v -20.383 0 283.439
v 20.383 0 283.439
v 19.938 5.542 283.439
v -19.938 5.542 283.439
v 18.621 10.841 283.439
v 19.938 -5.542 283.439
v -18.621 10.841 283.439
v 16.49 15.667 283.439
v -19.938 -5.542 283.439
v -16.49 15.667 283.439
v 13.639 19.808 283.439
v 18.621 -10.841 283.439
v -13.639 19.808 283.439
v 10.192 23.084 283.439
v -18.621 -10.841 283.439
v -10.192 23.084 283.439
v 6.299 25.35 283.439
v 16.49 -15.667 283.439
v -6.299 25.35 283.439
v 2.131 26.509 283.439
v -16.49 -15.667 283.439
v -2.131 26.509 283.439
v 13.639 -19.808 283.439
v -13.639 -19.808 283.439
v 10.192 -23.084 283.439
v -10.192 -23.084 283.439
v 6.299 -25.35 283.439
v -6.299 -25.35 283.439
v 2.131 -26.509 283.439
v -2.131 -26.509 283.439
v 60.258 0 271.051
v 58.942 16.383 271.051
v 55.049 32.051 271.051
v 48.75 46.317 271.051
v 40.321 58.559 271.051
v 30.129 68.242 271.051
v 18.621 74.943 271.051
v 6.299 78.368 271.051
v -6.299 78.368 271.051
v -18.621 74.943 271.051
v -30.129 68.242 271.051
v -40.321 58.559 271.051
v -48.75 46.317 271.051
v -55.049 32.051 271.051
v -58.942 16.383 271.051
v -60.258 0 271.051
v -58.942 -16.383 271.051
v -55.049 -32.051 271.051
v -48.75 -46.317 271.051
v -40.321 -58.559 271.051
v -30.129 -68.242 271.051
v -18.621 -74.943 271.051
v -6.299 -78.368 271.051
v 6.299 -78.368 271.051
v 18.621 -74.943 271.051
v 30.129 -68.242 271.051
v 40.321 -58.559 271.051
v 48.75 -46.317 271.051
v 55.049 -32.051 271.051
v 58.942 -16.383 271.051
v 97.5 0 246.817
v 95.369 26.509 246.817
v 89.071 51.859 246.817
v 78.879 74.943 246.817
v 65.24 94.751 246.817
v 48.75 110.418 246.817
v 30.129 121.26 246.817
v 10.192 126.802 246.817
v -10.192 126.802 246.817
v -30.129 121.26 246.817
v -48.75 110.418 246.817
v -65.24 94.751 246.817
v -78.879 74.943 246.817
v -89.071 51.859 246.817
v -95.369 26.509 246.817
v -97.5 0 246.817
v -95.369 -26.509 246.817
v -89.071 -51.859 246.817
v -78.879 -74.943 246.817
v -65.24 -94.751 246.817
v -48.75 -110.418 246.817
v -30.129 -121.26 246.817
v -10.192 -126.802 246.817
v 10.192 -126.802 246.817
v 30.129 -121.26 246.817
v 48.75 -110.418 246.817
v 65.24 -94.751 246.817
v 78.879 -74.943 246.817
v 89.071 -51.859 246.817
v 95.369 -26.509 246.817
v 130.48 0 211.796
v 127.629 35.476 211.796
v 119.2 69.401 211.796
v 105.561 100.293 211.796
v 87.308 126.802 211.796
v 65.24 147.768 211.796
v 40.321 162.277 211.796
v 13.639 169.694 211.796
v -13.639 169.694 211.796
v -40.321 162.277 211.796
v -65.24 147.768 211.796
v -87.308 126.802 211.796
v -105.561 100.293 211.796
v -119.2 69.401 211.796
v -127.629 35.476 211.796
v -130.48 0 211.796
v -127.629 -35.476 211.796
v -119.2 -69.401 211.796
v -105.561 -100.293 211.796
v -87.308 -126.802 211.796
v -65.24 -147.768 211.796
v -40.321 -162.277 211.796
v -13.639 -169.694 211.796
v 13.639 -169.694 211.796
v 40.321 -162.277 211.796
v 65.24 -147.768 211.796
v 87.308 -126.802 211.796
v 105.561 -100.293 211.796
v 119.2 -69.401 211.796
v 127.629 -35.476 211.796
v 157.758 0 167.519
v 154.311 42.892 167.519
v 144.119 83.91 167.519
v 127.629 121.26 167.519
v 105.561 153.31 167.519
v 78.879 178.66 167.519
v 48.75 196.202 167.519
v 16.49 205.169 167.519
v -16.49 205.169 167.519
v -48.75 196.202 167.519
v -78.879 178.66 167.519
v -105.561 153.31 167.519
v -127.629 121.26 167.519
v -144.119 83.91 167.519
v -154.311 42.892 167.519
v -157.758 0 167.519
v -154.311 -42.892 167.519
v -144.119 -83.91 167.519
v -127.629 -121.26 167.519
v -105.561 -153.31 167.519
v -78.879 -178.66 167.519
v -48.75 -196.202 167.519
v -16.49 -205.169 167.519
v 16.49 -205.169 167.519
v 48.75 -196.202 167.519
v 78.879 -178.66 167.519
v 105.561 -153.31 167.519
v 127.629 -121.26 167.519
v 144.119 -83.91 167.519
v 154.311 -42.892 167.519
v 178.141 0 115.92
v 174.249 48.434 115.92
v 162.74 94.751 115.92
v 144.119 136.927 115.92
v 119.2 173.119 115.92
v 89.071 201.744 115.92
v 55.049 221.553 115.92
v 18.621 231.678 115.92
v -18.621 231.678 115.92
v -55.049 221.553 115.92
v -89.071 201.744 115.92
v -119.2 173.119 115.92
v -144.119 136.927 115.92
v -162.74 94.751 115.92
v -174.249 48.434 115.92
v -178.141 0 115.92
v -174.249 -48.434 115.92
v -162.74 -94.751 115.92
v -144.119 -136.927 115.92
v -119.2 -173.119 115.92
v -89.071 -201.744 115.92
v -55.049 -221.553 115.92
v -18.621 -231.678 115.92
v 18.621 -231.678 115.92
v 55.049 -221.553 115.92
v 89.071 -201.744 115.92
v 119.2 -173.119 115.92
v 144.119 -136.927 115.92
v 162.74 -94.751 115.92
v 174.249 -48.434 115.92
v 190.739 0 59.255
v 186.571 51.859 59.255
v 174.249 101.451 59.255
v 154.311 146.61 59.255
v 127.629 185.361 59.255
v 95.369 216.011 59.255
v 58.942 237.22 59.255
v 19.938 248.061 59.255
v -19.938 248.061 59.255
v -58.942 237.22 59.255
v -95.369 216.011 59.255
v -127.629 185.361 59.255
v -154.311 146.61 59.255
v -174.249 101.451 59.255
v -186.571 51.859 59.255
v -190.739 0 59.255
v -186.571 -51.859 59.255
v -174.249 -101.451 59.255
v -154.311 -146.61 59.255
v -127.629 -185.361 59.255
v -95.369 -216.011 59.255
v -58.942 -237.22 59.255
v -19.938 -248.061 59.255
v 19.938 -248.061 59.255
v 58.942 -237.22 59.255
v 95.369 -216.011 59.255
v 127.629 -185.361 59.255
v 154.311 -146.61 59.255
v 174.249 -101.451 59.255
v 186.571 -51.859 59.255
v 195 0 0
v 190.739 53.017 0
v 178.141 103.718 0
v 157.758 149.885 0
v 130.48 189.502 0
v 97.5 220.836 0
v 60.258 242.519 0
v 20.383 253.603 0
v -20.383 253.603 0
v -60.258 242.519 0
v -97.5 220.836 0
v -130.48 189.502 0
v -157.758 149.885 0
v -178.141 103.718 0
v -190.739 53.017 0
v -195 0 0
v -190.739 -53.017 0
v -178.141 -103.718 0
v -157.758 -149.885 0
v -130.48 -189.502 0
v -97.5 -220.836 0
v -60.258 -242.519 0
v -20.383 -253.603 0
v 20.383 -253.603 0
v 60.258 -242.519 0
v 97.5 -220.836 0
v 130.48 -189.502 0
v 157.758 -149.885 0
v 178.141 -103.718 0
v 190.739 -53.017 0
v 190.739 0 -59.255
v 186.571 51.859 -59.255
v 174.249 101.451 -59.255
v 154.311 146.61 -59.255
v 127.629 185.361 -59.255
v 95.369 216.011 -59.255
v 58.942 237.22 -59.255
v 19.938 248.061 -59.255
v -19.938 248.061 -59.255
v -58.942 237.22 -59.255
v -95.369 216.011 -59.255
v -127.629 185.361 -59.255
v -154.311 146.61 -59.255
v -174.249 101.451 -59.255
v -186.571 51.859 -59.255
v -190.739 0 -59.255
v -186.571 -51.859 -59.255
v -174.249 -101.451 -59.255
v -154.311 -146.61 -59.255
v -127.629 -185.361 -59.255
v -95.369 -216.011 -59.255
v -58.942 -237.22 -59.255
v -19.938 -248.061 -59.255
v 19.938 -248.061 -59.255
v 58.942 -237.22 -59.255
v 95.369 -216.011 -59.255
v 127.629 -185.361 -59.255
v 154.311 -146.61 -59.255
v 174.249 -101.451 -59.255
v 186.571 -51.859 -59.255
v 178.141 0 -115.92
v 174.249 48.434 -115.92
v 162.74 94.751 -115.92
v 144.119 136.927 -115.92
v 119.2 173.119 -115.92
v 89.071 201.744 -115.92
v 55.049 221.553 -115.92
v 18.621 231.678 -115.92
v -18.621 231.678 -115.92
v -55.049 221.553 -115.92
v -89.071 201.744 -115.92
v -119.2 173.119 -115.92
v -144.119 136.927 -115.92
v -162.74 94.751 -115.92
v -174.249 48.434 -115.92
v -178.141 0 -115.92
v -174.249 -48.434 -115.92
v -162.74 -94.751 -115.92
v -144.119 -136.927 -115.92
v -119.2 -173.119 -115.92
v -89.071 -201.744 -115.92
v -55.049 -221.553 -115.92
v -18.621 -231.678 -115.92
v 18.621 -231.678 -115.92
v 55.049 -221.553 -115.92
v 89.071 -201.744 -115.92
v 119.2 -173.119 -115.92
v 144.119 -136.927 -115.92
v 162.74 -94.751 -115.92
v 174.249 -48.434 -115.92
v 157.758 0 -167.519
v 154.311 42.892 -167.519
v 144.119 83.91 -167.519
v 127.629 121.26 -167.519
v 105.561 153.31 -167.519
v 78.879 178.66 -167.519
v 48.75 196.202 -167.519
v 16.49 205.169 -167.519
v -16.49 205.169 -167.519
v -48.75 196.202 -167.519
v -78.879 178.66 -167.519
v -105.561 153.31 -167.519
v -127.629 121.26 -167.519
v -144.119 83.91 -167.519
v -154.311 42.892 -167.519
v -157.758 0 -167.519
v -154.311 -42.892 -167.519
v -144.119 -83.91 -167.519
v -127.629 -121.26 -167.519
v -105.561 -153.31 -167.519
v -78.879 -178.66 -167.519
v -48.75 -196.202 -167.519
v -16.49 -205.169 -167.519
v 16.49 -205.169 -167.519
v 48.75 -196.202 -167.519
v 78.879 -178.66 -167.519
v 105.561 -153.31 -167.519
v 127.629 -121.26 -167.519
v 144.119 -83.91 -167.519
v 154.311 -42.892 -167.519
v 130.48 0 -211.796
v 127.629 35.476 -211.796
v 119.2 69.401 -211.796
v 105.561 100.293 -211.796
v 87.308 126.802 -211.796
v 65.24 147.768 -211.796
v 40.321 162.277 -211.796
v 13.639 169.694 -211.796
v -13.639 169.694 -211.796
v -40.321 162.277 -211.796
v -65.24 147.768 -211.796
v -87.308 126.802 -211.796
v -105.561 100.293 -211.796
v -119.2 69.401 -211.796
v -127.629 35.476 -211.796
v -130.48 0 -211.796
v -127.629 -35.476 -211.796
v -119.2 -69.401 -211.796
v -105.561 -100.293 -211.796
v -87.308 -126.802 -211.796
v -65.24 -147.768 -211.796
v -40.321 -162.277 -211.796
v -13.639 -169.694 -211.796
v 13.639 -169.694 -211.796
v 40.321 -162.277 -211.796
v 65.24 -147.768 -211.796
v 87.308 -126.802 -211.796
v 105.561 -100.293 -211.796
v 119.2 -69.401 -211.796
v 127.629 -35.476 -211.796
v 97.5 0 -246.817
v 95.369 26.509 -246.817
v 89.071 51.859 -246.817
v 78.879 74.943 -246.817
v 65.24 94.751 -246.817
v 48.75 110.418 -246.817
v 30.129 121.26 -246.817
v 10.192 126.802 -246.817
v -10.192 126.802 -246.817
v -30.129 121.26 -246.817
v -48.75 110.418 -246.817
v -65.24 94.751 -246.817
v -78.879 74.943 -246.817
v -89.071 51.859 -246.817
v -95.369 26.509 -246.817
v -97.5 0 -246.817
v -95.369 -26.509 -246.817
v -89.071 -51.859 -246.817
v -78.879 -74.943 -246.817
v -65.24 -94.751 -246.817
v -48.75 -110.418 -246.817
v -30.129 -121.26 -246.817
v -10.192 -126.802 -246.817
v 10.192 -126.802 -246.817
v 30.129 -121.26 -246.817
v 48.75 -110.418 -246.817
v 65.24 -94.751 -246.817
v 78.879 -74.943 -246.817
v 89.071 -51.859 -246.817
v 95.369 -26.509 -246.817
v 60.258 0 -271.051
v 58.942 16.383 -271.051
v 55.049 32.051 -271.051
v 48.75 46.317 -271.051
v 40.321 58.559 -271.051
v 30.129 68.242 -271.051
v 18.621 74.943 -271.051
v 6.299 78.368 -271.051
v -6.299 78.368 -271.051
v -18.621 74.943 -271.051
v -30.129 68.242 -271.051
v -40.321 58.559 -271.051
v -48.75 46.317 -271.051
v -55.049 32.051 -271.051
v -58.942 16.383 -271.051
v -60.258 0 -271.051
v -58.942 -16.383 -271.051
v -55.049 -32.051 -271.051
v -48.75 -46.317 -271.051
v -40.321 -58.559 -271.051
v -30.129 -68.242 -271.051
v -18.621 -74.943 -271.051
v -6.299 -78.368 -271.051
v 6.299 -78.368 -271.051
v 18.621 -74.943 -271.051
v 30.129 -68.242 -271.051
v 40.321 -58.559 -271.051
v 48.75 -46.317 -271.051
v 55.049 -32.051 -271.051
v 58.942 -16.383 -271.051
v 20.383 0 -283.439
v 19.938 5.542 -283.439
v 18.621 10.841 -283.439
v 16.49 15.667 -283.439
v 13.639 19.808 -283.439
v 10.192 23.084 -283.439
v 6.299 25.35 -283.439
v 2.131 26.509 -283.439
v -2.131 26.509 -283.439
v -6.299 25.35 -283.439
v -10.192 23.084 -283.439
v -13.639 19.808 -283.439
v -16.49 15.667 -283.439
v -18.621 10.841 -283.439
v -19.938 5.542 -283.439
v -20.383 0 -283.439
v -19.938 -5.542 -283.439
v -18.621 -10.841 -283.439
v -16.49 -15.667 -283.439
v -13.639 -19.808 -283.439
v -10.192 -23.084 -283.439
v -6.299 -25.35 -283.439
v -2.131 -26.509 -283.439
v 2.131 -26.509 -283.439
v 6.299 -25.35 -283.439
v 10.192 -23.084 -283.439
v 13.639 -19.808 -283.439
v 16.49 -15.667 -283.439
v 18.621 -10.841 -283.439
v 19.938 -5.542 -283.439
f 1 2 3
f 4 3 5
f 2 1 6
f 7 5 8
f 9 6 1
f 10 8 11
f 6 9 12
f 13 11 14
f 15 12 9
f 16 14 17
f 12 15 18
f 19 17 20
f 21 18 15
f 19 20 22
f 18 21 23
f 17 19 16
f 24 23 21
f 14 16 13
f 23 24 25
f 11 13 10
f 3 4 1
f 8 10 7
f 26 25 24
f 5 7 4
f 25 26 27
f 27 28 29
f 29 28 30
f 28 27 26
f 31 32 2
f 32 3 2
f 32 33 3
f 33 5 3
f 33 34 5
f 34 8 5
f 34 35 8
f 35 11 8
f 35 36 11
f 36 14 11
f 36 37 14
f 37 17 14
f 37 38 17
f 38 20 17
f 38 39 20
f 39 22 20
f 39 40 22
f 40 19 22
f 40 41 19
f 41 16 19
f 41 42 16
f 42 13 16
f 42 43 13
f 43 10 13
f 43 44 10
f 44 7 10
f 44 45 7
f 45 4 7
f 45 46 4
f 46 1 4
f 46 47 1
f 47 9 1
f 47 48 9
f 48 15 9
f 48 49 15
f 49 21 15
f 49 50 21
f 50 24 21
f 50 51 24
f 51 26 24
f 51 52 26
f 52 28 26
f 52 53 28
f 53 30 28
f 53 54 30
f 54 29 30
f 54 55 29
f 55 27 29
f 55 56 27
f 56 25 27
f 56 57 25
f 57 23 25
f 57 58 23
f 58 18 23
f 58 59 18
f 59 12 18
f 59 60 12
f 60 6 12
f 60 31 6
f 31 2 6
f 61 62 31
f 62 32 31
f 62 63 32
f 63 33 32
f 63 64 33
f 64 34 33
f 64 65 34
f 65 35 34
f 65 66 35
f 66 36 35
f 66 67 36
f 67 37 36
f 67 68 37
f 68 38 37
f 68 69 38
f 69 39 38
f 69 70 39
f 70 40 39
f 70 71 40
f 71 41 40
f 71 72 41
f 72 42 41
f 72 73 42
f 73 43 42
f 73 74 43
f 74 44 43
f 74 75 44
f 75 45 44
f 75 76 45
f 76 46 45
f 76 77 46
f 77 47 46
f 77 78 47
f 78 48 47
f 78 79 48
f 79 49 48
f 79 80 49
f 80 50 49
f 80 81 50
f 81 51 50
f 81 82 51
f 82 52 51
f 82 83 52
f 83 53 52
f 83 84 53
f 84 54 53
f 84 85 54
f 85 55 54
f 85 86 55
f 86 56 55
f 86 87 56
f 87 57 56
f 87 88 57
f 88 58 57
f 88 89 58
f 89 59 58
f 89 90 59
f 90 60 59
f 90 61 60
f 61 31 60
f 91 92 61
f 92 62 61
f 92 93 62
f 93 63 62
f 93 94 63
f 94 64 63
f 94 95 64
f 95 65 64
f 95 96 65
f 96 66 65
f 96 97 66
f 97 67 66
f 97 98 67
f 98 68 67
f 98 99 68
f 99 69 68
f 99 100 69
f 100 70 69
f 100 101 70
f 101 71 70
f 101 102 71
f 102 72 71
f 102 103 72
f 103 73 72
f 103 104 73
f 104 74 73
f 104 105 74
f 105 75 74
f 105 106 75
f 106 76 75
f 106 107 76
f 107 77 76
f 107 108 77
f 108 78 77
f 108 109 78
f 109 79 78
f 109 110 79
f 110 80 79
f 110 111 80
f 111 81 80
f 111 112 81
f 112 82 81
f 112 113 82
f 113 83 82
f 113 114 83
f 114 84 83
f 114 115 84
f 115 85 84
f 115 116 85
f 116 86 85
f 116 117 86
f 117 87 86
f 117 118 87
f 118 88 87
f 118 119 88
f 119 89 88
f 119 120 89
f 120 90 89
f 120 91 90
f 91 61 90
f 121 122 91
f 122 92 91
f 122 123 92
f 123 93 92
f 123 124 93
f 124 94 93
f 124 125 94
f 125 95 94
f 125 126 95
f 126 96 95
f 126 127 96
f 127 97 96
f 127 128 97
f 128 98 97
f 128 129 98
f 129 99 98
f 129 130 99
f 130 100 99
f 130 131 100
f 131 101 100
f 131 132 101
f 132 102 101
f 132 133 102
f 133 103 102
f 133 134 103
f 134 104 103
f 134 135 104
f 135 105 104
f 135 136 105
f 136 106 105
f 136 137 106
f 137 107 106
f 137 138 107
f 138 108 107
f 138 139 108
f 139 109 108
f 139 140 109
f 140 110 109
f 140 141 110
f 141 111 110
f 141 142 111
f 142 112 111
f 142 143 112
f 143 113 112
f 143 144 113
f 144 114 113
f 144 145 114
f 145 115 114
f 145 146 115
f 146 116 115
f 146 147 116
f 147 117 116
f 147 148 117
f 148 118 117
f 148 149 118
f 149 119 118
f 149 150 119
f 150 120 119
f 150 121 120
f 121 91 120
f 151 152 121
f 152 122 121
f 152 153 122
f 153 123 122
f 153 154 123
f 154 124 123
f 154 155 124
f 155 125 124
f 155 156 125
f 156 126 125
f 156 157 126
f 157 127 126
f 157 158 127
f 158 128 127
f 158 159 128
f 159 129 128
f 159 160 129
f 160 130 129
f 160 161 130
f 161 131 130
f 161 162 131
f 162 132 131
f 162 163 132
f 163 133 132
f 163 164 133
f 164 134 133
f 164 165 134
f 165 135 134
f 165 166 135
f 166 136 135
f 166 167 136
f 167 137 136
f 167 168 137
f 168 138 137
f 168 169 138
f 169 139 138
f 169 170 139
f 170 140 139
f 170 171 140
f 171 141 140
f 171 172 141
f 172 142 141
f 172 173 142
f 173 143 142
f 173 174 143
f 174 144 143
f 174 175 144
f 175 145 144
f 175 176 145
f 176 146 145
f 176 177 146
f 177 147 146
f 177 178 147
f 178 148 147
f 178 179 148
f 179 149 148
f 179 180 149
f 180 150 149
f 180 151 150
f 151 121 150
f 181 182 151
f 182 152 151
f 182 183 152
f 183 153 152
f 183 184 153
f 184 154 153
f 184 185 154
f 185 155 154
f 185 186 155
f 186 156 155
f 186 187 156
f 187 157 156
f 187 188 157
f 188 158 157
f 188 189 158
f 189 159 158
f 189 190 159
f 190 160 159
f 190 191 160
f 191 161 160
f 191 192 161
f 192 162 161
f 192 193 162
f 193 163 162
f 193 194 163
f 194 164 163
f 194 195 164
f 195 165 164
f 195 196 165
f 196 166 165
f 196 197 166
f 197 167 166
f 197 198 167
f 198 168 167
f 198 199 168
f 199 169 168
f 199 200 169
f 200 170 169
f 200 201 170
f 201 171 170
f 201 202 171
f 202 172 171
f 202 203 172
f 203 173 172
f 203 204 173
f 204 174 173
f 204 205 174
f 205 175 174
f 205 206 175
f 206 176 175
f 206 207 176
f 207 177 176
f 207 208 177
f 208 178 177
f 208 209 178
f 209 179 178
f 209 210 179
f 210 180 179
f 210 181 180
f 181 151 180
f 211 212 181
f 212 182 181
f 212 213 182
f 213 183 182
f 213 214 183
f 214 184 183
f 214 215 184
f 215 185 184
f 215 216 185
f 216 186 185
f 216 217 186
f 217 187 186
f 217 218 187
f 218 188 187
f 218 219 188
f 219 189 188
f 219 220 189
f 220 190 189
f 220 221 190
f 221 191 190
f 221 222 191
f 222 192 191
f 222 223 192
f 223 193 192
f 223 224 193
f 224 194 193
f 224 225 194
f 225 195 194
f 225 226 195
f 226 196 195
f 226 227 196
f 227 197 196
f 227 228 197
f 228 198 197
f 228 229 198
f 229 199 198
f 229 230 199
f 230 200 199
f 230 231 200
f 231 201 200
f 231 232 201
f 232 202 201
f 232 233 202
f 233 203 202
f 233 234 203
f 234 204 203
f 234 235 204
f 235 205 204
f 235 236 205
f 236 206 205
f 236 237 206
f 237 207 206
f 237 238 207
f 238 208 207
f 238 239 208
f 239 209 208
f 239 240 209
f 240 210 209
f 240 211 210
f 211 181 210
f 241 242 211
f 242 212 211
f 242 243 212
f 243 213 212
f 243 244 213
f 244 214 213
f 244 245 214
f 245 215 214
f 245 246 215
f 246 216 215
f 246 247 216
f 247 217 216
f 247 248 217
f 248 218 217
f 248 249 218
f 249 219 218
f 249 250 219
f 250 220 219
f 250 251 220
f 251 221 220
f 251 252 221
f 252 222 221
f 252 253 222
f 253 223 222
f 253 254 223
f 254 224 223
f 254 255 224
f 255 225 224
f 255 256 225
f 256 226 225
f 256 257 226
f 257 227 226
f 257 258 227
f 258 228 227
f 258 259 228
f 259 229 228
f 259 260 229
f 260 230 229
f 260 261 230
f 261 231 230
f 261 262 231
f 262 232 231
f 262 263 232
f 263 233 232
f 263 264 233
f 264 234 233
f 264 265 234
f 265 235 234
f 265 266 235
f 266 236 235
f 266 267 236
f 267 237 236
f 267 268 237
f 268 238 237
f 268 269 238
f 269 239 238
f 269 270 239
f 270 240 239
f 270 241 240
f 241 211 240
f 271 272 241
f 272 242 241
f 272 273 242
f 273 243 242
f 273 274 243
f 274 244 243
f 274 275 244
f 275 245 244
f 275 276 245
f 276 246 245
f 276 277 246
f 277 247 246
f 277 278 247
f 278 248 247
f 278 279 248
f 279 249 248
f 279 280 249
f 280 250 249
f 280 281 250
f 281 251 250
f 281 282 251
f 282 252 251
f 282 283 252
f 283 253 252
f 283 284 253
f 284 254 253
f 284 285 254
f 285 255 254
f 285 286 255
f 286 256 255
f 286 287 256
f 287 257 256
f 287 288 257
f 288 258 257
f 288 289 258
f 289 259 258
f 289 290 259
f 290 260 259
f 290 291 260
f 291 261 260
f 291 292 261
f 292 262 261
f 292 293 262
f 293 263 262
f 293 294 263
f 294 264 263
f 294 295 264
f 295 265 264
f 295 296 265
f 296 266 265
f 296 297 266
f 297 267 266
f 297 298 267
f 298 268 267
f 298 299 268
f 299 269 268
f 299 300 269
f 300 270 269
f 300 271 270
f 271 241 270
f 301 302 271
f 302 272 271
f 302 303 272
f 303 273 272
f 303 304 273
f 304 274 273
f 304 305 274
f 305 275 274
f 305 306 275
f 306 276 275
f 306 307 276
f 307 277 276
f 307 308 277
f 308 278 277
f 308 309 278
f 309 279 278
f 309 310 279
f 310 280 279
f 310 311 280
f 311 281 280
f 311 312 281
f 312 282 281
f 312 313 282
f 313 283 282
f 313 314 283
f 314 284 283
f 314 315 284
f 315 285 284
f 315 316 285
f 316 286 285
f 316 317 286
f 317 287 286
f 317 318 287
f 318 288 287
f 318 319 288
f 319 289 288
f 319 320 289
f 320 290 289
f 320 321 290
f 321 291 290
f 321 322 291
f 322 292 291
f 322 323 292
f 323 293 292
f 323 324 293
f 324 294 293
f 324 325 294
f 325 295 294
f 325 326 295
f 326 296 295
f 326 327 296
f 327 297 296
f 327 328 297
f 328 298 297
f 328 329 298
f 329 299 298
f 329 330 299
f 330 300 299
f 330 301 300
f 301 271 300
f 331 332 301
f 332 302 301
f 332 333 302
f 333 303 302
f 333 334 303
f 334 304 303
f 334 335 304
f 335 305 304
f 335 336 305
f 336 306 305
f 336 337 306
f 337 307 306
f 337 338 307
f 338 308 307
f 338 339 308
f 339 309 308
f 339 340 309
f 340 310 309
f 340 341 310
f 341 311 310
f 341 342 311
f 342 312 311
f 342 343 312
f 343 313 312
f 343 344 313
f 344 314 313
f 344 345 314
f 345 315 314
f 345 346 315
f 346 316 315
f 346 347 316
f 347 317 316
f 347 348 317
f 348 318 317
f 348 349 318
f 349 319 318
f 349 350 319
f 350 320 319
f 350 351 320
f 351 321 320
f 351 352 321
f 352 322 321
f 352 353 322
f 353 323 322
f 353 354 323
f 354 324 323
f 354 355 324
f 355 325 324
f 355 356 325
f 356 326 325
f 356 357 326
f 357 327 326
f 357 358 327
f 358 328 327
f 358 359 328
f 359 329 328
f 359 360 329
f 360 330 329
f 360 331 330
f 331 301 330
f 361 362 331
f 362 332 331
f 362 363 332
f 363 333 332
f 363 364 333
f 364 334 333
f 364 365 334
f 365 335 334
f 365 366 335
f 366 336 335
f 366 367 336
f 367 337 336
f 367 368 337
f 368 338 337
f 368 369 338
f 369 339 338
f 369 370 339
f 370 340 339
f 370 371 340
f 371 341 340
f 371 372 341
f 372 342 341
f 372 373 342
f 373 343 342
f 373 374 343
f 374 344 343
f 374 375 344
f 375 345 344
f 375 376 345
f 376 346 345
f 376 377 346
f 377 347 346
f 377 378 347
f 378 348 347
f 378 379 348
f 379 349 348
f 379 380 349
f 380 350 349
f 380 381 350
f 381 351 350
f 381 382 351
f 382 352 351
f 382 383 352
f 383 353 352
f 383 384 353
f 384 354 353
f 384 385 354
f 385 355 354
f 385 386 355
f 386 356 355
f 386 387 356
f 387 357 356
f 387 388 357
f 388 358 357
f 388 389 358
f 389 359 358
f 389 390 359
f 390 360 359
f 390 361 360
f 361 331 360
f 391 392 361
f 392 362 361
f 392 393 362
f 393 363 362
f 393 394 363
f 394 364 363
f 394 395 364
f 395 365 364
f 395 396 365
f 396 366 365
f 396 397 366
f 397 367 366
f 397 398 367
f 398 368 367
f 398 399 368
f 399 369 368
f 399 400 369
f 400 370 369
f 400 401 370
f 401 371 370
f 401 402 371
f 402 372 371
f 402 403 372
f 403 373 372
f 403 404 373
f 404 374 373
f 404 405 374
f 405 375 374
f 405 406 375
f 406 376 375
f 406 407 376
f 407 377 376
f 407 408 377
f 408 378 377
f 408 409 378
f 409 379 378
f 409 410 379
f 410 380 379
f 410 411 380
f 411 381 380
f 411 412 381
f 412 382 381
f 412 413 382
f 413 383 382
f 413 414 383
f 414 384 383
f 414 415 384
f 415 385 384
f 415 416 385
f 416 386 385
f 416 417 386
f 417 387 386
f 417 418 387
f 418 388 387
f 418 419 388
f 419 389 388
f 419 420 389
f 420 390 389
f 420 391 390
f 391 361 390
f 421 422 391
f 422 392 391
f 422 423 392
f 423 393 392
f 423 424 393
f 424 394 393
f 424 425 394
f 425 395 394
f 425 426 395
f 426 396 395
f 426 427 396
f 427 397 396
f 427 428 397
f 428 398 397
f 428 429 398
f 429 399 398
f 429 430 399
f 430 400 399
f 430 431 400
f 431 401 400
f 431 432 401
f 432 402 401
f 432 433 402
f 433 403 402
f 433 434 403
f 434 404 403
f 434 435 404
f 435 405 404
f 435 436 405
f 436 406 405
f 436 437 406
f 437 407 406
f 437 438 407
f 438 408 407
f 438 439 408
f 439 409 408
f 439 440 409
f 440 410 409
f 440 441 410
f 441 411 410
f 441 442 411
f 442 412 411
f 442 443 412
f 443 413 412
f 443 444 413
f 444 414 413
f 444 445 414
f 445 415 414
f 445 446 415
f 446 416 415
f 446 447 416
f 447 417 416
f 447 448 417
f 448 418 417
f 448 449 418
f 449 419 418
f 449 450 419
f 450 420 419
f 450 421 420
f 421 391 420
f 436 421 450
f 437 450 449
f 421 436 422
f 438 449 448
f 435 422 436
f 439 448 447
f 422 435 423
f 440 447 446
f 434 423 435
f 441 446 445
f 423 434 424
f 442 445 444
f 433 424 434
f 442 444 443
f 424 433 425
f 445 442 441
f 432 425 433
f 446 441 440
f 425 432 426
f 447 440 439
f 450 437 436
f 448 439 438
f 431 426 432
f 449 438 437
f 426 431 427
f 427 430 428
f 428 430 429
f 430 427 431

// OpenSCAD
// Generated by SolidPython 1.0.1 on 2020-07-29 00:46:51


scale(v = [13, 17, 19]) {
	sphere(r = 15);
}
/***********************************************
*********      SolidPython code:      **********
************************************************
 
# import packages: SolidPython
from solid import *
from solid.utils import *
from itertools import chain, combinations, permutations


class Resize:

    def __init__(self, scad_file):
        self.scad_file = scad_file
        #self.scad_file = import_scad(scad_file)
        # cone/cylinder param:
        self.r1 = 0
        self.r2 = 0
        self.h = 0
        # rectangular prism param:
        self.w = 0
        self.l = 0
        # ellipse param:
        self.r = 0

    # import OpenScad code (file name corresponds to shape)


    # classify shape + parameters
    def assign(self, param1, param2, param3):
        if self.scad_file == 'cone.scad':
            self.r1 = param1
            self.r2 = param2
            self.h = param3
        elif self.scad_file == 'cylinder.scad':
            self.r1 = param1
            self.r2 = param2
            self.h = param3
        elif self.scad_file == 'rectangularPrism.scad':
            self.h = param1
            self.l = param2
            self.w = param3
        else:
            self.r = param1
            self.h = param2

    # resize parameters
    def iterate(self):
        x = range(3, 20, 2)
        i = 1
        if self.scad_file == 'cone.scad':
            tempList = list(permutations(x, 2))
            for temp in tempList:
                param1 = temp[0]
                param2 = temp[1]
                filepath = 'produced_scad_files/' + 'cone' + str(param1) + '_' + str(param2) + '_' + '.scad'
                scad_render_to_file(cylinder(h=param1, r1=param2, r2=0), filepath)

        elif self.scad_file == 'cylinder.scad':
            tempList = list(permutations(x, 3))
            for temp in tempList:
                param1 = temp[0]
                param2 = temp[1]
                filepath = 'produced_scad_files/' + 'cylinder' + str(param1) + '_' + str(param2) + '_' + '.scad'
                scad_render_to_file(cylinder(h=param1, r1=param2, r2=param2), filepath)

        elif self.scad_file == 'rectangularPrism.scad':
            tempList = list(permutations(x, 3))
            for temp in tempList:
                param1 = temp[0]
                param2 = temp[1]
                param3 = temp[2]
                filepath = 'produced_scad_files/' + 'rectangularPrism' + str(param1) + '_' + str(param2) + '_' + str(
                    param3) + '.scad'
                scad_render_to_file(cube(size=(param1, param2, param3)), filepath)

        elif self.scad_file == 'ellipse.scad':
            tempList = list(permutations(x, 4))
            for temp in tempList:
                param1 = temp[0]
                param2 = temp[1]
                param3 = temp[2]
                param4 = temp[3]
                filepath = 'produced_scad_files/' + 'ellipse' + str(param1) + '_' + str(param2) + '_' + str(param3) + '_' + str(param4) + '.scad'
                scad_render_to_file(scale([param1, param2, param3])(sphere(r=param4)), filepath)

    def render_to_scadfile(self):
        scad_render_to_file(scad, 'example.scad') 
 
************************************************/
